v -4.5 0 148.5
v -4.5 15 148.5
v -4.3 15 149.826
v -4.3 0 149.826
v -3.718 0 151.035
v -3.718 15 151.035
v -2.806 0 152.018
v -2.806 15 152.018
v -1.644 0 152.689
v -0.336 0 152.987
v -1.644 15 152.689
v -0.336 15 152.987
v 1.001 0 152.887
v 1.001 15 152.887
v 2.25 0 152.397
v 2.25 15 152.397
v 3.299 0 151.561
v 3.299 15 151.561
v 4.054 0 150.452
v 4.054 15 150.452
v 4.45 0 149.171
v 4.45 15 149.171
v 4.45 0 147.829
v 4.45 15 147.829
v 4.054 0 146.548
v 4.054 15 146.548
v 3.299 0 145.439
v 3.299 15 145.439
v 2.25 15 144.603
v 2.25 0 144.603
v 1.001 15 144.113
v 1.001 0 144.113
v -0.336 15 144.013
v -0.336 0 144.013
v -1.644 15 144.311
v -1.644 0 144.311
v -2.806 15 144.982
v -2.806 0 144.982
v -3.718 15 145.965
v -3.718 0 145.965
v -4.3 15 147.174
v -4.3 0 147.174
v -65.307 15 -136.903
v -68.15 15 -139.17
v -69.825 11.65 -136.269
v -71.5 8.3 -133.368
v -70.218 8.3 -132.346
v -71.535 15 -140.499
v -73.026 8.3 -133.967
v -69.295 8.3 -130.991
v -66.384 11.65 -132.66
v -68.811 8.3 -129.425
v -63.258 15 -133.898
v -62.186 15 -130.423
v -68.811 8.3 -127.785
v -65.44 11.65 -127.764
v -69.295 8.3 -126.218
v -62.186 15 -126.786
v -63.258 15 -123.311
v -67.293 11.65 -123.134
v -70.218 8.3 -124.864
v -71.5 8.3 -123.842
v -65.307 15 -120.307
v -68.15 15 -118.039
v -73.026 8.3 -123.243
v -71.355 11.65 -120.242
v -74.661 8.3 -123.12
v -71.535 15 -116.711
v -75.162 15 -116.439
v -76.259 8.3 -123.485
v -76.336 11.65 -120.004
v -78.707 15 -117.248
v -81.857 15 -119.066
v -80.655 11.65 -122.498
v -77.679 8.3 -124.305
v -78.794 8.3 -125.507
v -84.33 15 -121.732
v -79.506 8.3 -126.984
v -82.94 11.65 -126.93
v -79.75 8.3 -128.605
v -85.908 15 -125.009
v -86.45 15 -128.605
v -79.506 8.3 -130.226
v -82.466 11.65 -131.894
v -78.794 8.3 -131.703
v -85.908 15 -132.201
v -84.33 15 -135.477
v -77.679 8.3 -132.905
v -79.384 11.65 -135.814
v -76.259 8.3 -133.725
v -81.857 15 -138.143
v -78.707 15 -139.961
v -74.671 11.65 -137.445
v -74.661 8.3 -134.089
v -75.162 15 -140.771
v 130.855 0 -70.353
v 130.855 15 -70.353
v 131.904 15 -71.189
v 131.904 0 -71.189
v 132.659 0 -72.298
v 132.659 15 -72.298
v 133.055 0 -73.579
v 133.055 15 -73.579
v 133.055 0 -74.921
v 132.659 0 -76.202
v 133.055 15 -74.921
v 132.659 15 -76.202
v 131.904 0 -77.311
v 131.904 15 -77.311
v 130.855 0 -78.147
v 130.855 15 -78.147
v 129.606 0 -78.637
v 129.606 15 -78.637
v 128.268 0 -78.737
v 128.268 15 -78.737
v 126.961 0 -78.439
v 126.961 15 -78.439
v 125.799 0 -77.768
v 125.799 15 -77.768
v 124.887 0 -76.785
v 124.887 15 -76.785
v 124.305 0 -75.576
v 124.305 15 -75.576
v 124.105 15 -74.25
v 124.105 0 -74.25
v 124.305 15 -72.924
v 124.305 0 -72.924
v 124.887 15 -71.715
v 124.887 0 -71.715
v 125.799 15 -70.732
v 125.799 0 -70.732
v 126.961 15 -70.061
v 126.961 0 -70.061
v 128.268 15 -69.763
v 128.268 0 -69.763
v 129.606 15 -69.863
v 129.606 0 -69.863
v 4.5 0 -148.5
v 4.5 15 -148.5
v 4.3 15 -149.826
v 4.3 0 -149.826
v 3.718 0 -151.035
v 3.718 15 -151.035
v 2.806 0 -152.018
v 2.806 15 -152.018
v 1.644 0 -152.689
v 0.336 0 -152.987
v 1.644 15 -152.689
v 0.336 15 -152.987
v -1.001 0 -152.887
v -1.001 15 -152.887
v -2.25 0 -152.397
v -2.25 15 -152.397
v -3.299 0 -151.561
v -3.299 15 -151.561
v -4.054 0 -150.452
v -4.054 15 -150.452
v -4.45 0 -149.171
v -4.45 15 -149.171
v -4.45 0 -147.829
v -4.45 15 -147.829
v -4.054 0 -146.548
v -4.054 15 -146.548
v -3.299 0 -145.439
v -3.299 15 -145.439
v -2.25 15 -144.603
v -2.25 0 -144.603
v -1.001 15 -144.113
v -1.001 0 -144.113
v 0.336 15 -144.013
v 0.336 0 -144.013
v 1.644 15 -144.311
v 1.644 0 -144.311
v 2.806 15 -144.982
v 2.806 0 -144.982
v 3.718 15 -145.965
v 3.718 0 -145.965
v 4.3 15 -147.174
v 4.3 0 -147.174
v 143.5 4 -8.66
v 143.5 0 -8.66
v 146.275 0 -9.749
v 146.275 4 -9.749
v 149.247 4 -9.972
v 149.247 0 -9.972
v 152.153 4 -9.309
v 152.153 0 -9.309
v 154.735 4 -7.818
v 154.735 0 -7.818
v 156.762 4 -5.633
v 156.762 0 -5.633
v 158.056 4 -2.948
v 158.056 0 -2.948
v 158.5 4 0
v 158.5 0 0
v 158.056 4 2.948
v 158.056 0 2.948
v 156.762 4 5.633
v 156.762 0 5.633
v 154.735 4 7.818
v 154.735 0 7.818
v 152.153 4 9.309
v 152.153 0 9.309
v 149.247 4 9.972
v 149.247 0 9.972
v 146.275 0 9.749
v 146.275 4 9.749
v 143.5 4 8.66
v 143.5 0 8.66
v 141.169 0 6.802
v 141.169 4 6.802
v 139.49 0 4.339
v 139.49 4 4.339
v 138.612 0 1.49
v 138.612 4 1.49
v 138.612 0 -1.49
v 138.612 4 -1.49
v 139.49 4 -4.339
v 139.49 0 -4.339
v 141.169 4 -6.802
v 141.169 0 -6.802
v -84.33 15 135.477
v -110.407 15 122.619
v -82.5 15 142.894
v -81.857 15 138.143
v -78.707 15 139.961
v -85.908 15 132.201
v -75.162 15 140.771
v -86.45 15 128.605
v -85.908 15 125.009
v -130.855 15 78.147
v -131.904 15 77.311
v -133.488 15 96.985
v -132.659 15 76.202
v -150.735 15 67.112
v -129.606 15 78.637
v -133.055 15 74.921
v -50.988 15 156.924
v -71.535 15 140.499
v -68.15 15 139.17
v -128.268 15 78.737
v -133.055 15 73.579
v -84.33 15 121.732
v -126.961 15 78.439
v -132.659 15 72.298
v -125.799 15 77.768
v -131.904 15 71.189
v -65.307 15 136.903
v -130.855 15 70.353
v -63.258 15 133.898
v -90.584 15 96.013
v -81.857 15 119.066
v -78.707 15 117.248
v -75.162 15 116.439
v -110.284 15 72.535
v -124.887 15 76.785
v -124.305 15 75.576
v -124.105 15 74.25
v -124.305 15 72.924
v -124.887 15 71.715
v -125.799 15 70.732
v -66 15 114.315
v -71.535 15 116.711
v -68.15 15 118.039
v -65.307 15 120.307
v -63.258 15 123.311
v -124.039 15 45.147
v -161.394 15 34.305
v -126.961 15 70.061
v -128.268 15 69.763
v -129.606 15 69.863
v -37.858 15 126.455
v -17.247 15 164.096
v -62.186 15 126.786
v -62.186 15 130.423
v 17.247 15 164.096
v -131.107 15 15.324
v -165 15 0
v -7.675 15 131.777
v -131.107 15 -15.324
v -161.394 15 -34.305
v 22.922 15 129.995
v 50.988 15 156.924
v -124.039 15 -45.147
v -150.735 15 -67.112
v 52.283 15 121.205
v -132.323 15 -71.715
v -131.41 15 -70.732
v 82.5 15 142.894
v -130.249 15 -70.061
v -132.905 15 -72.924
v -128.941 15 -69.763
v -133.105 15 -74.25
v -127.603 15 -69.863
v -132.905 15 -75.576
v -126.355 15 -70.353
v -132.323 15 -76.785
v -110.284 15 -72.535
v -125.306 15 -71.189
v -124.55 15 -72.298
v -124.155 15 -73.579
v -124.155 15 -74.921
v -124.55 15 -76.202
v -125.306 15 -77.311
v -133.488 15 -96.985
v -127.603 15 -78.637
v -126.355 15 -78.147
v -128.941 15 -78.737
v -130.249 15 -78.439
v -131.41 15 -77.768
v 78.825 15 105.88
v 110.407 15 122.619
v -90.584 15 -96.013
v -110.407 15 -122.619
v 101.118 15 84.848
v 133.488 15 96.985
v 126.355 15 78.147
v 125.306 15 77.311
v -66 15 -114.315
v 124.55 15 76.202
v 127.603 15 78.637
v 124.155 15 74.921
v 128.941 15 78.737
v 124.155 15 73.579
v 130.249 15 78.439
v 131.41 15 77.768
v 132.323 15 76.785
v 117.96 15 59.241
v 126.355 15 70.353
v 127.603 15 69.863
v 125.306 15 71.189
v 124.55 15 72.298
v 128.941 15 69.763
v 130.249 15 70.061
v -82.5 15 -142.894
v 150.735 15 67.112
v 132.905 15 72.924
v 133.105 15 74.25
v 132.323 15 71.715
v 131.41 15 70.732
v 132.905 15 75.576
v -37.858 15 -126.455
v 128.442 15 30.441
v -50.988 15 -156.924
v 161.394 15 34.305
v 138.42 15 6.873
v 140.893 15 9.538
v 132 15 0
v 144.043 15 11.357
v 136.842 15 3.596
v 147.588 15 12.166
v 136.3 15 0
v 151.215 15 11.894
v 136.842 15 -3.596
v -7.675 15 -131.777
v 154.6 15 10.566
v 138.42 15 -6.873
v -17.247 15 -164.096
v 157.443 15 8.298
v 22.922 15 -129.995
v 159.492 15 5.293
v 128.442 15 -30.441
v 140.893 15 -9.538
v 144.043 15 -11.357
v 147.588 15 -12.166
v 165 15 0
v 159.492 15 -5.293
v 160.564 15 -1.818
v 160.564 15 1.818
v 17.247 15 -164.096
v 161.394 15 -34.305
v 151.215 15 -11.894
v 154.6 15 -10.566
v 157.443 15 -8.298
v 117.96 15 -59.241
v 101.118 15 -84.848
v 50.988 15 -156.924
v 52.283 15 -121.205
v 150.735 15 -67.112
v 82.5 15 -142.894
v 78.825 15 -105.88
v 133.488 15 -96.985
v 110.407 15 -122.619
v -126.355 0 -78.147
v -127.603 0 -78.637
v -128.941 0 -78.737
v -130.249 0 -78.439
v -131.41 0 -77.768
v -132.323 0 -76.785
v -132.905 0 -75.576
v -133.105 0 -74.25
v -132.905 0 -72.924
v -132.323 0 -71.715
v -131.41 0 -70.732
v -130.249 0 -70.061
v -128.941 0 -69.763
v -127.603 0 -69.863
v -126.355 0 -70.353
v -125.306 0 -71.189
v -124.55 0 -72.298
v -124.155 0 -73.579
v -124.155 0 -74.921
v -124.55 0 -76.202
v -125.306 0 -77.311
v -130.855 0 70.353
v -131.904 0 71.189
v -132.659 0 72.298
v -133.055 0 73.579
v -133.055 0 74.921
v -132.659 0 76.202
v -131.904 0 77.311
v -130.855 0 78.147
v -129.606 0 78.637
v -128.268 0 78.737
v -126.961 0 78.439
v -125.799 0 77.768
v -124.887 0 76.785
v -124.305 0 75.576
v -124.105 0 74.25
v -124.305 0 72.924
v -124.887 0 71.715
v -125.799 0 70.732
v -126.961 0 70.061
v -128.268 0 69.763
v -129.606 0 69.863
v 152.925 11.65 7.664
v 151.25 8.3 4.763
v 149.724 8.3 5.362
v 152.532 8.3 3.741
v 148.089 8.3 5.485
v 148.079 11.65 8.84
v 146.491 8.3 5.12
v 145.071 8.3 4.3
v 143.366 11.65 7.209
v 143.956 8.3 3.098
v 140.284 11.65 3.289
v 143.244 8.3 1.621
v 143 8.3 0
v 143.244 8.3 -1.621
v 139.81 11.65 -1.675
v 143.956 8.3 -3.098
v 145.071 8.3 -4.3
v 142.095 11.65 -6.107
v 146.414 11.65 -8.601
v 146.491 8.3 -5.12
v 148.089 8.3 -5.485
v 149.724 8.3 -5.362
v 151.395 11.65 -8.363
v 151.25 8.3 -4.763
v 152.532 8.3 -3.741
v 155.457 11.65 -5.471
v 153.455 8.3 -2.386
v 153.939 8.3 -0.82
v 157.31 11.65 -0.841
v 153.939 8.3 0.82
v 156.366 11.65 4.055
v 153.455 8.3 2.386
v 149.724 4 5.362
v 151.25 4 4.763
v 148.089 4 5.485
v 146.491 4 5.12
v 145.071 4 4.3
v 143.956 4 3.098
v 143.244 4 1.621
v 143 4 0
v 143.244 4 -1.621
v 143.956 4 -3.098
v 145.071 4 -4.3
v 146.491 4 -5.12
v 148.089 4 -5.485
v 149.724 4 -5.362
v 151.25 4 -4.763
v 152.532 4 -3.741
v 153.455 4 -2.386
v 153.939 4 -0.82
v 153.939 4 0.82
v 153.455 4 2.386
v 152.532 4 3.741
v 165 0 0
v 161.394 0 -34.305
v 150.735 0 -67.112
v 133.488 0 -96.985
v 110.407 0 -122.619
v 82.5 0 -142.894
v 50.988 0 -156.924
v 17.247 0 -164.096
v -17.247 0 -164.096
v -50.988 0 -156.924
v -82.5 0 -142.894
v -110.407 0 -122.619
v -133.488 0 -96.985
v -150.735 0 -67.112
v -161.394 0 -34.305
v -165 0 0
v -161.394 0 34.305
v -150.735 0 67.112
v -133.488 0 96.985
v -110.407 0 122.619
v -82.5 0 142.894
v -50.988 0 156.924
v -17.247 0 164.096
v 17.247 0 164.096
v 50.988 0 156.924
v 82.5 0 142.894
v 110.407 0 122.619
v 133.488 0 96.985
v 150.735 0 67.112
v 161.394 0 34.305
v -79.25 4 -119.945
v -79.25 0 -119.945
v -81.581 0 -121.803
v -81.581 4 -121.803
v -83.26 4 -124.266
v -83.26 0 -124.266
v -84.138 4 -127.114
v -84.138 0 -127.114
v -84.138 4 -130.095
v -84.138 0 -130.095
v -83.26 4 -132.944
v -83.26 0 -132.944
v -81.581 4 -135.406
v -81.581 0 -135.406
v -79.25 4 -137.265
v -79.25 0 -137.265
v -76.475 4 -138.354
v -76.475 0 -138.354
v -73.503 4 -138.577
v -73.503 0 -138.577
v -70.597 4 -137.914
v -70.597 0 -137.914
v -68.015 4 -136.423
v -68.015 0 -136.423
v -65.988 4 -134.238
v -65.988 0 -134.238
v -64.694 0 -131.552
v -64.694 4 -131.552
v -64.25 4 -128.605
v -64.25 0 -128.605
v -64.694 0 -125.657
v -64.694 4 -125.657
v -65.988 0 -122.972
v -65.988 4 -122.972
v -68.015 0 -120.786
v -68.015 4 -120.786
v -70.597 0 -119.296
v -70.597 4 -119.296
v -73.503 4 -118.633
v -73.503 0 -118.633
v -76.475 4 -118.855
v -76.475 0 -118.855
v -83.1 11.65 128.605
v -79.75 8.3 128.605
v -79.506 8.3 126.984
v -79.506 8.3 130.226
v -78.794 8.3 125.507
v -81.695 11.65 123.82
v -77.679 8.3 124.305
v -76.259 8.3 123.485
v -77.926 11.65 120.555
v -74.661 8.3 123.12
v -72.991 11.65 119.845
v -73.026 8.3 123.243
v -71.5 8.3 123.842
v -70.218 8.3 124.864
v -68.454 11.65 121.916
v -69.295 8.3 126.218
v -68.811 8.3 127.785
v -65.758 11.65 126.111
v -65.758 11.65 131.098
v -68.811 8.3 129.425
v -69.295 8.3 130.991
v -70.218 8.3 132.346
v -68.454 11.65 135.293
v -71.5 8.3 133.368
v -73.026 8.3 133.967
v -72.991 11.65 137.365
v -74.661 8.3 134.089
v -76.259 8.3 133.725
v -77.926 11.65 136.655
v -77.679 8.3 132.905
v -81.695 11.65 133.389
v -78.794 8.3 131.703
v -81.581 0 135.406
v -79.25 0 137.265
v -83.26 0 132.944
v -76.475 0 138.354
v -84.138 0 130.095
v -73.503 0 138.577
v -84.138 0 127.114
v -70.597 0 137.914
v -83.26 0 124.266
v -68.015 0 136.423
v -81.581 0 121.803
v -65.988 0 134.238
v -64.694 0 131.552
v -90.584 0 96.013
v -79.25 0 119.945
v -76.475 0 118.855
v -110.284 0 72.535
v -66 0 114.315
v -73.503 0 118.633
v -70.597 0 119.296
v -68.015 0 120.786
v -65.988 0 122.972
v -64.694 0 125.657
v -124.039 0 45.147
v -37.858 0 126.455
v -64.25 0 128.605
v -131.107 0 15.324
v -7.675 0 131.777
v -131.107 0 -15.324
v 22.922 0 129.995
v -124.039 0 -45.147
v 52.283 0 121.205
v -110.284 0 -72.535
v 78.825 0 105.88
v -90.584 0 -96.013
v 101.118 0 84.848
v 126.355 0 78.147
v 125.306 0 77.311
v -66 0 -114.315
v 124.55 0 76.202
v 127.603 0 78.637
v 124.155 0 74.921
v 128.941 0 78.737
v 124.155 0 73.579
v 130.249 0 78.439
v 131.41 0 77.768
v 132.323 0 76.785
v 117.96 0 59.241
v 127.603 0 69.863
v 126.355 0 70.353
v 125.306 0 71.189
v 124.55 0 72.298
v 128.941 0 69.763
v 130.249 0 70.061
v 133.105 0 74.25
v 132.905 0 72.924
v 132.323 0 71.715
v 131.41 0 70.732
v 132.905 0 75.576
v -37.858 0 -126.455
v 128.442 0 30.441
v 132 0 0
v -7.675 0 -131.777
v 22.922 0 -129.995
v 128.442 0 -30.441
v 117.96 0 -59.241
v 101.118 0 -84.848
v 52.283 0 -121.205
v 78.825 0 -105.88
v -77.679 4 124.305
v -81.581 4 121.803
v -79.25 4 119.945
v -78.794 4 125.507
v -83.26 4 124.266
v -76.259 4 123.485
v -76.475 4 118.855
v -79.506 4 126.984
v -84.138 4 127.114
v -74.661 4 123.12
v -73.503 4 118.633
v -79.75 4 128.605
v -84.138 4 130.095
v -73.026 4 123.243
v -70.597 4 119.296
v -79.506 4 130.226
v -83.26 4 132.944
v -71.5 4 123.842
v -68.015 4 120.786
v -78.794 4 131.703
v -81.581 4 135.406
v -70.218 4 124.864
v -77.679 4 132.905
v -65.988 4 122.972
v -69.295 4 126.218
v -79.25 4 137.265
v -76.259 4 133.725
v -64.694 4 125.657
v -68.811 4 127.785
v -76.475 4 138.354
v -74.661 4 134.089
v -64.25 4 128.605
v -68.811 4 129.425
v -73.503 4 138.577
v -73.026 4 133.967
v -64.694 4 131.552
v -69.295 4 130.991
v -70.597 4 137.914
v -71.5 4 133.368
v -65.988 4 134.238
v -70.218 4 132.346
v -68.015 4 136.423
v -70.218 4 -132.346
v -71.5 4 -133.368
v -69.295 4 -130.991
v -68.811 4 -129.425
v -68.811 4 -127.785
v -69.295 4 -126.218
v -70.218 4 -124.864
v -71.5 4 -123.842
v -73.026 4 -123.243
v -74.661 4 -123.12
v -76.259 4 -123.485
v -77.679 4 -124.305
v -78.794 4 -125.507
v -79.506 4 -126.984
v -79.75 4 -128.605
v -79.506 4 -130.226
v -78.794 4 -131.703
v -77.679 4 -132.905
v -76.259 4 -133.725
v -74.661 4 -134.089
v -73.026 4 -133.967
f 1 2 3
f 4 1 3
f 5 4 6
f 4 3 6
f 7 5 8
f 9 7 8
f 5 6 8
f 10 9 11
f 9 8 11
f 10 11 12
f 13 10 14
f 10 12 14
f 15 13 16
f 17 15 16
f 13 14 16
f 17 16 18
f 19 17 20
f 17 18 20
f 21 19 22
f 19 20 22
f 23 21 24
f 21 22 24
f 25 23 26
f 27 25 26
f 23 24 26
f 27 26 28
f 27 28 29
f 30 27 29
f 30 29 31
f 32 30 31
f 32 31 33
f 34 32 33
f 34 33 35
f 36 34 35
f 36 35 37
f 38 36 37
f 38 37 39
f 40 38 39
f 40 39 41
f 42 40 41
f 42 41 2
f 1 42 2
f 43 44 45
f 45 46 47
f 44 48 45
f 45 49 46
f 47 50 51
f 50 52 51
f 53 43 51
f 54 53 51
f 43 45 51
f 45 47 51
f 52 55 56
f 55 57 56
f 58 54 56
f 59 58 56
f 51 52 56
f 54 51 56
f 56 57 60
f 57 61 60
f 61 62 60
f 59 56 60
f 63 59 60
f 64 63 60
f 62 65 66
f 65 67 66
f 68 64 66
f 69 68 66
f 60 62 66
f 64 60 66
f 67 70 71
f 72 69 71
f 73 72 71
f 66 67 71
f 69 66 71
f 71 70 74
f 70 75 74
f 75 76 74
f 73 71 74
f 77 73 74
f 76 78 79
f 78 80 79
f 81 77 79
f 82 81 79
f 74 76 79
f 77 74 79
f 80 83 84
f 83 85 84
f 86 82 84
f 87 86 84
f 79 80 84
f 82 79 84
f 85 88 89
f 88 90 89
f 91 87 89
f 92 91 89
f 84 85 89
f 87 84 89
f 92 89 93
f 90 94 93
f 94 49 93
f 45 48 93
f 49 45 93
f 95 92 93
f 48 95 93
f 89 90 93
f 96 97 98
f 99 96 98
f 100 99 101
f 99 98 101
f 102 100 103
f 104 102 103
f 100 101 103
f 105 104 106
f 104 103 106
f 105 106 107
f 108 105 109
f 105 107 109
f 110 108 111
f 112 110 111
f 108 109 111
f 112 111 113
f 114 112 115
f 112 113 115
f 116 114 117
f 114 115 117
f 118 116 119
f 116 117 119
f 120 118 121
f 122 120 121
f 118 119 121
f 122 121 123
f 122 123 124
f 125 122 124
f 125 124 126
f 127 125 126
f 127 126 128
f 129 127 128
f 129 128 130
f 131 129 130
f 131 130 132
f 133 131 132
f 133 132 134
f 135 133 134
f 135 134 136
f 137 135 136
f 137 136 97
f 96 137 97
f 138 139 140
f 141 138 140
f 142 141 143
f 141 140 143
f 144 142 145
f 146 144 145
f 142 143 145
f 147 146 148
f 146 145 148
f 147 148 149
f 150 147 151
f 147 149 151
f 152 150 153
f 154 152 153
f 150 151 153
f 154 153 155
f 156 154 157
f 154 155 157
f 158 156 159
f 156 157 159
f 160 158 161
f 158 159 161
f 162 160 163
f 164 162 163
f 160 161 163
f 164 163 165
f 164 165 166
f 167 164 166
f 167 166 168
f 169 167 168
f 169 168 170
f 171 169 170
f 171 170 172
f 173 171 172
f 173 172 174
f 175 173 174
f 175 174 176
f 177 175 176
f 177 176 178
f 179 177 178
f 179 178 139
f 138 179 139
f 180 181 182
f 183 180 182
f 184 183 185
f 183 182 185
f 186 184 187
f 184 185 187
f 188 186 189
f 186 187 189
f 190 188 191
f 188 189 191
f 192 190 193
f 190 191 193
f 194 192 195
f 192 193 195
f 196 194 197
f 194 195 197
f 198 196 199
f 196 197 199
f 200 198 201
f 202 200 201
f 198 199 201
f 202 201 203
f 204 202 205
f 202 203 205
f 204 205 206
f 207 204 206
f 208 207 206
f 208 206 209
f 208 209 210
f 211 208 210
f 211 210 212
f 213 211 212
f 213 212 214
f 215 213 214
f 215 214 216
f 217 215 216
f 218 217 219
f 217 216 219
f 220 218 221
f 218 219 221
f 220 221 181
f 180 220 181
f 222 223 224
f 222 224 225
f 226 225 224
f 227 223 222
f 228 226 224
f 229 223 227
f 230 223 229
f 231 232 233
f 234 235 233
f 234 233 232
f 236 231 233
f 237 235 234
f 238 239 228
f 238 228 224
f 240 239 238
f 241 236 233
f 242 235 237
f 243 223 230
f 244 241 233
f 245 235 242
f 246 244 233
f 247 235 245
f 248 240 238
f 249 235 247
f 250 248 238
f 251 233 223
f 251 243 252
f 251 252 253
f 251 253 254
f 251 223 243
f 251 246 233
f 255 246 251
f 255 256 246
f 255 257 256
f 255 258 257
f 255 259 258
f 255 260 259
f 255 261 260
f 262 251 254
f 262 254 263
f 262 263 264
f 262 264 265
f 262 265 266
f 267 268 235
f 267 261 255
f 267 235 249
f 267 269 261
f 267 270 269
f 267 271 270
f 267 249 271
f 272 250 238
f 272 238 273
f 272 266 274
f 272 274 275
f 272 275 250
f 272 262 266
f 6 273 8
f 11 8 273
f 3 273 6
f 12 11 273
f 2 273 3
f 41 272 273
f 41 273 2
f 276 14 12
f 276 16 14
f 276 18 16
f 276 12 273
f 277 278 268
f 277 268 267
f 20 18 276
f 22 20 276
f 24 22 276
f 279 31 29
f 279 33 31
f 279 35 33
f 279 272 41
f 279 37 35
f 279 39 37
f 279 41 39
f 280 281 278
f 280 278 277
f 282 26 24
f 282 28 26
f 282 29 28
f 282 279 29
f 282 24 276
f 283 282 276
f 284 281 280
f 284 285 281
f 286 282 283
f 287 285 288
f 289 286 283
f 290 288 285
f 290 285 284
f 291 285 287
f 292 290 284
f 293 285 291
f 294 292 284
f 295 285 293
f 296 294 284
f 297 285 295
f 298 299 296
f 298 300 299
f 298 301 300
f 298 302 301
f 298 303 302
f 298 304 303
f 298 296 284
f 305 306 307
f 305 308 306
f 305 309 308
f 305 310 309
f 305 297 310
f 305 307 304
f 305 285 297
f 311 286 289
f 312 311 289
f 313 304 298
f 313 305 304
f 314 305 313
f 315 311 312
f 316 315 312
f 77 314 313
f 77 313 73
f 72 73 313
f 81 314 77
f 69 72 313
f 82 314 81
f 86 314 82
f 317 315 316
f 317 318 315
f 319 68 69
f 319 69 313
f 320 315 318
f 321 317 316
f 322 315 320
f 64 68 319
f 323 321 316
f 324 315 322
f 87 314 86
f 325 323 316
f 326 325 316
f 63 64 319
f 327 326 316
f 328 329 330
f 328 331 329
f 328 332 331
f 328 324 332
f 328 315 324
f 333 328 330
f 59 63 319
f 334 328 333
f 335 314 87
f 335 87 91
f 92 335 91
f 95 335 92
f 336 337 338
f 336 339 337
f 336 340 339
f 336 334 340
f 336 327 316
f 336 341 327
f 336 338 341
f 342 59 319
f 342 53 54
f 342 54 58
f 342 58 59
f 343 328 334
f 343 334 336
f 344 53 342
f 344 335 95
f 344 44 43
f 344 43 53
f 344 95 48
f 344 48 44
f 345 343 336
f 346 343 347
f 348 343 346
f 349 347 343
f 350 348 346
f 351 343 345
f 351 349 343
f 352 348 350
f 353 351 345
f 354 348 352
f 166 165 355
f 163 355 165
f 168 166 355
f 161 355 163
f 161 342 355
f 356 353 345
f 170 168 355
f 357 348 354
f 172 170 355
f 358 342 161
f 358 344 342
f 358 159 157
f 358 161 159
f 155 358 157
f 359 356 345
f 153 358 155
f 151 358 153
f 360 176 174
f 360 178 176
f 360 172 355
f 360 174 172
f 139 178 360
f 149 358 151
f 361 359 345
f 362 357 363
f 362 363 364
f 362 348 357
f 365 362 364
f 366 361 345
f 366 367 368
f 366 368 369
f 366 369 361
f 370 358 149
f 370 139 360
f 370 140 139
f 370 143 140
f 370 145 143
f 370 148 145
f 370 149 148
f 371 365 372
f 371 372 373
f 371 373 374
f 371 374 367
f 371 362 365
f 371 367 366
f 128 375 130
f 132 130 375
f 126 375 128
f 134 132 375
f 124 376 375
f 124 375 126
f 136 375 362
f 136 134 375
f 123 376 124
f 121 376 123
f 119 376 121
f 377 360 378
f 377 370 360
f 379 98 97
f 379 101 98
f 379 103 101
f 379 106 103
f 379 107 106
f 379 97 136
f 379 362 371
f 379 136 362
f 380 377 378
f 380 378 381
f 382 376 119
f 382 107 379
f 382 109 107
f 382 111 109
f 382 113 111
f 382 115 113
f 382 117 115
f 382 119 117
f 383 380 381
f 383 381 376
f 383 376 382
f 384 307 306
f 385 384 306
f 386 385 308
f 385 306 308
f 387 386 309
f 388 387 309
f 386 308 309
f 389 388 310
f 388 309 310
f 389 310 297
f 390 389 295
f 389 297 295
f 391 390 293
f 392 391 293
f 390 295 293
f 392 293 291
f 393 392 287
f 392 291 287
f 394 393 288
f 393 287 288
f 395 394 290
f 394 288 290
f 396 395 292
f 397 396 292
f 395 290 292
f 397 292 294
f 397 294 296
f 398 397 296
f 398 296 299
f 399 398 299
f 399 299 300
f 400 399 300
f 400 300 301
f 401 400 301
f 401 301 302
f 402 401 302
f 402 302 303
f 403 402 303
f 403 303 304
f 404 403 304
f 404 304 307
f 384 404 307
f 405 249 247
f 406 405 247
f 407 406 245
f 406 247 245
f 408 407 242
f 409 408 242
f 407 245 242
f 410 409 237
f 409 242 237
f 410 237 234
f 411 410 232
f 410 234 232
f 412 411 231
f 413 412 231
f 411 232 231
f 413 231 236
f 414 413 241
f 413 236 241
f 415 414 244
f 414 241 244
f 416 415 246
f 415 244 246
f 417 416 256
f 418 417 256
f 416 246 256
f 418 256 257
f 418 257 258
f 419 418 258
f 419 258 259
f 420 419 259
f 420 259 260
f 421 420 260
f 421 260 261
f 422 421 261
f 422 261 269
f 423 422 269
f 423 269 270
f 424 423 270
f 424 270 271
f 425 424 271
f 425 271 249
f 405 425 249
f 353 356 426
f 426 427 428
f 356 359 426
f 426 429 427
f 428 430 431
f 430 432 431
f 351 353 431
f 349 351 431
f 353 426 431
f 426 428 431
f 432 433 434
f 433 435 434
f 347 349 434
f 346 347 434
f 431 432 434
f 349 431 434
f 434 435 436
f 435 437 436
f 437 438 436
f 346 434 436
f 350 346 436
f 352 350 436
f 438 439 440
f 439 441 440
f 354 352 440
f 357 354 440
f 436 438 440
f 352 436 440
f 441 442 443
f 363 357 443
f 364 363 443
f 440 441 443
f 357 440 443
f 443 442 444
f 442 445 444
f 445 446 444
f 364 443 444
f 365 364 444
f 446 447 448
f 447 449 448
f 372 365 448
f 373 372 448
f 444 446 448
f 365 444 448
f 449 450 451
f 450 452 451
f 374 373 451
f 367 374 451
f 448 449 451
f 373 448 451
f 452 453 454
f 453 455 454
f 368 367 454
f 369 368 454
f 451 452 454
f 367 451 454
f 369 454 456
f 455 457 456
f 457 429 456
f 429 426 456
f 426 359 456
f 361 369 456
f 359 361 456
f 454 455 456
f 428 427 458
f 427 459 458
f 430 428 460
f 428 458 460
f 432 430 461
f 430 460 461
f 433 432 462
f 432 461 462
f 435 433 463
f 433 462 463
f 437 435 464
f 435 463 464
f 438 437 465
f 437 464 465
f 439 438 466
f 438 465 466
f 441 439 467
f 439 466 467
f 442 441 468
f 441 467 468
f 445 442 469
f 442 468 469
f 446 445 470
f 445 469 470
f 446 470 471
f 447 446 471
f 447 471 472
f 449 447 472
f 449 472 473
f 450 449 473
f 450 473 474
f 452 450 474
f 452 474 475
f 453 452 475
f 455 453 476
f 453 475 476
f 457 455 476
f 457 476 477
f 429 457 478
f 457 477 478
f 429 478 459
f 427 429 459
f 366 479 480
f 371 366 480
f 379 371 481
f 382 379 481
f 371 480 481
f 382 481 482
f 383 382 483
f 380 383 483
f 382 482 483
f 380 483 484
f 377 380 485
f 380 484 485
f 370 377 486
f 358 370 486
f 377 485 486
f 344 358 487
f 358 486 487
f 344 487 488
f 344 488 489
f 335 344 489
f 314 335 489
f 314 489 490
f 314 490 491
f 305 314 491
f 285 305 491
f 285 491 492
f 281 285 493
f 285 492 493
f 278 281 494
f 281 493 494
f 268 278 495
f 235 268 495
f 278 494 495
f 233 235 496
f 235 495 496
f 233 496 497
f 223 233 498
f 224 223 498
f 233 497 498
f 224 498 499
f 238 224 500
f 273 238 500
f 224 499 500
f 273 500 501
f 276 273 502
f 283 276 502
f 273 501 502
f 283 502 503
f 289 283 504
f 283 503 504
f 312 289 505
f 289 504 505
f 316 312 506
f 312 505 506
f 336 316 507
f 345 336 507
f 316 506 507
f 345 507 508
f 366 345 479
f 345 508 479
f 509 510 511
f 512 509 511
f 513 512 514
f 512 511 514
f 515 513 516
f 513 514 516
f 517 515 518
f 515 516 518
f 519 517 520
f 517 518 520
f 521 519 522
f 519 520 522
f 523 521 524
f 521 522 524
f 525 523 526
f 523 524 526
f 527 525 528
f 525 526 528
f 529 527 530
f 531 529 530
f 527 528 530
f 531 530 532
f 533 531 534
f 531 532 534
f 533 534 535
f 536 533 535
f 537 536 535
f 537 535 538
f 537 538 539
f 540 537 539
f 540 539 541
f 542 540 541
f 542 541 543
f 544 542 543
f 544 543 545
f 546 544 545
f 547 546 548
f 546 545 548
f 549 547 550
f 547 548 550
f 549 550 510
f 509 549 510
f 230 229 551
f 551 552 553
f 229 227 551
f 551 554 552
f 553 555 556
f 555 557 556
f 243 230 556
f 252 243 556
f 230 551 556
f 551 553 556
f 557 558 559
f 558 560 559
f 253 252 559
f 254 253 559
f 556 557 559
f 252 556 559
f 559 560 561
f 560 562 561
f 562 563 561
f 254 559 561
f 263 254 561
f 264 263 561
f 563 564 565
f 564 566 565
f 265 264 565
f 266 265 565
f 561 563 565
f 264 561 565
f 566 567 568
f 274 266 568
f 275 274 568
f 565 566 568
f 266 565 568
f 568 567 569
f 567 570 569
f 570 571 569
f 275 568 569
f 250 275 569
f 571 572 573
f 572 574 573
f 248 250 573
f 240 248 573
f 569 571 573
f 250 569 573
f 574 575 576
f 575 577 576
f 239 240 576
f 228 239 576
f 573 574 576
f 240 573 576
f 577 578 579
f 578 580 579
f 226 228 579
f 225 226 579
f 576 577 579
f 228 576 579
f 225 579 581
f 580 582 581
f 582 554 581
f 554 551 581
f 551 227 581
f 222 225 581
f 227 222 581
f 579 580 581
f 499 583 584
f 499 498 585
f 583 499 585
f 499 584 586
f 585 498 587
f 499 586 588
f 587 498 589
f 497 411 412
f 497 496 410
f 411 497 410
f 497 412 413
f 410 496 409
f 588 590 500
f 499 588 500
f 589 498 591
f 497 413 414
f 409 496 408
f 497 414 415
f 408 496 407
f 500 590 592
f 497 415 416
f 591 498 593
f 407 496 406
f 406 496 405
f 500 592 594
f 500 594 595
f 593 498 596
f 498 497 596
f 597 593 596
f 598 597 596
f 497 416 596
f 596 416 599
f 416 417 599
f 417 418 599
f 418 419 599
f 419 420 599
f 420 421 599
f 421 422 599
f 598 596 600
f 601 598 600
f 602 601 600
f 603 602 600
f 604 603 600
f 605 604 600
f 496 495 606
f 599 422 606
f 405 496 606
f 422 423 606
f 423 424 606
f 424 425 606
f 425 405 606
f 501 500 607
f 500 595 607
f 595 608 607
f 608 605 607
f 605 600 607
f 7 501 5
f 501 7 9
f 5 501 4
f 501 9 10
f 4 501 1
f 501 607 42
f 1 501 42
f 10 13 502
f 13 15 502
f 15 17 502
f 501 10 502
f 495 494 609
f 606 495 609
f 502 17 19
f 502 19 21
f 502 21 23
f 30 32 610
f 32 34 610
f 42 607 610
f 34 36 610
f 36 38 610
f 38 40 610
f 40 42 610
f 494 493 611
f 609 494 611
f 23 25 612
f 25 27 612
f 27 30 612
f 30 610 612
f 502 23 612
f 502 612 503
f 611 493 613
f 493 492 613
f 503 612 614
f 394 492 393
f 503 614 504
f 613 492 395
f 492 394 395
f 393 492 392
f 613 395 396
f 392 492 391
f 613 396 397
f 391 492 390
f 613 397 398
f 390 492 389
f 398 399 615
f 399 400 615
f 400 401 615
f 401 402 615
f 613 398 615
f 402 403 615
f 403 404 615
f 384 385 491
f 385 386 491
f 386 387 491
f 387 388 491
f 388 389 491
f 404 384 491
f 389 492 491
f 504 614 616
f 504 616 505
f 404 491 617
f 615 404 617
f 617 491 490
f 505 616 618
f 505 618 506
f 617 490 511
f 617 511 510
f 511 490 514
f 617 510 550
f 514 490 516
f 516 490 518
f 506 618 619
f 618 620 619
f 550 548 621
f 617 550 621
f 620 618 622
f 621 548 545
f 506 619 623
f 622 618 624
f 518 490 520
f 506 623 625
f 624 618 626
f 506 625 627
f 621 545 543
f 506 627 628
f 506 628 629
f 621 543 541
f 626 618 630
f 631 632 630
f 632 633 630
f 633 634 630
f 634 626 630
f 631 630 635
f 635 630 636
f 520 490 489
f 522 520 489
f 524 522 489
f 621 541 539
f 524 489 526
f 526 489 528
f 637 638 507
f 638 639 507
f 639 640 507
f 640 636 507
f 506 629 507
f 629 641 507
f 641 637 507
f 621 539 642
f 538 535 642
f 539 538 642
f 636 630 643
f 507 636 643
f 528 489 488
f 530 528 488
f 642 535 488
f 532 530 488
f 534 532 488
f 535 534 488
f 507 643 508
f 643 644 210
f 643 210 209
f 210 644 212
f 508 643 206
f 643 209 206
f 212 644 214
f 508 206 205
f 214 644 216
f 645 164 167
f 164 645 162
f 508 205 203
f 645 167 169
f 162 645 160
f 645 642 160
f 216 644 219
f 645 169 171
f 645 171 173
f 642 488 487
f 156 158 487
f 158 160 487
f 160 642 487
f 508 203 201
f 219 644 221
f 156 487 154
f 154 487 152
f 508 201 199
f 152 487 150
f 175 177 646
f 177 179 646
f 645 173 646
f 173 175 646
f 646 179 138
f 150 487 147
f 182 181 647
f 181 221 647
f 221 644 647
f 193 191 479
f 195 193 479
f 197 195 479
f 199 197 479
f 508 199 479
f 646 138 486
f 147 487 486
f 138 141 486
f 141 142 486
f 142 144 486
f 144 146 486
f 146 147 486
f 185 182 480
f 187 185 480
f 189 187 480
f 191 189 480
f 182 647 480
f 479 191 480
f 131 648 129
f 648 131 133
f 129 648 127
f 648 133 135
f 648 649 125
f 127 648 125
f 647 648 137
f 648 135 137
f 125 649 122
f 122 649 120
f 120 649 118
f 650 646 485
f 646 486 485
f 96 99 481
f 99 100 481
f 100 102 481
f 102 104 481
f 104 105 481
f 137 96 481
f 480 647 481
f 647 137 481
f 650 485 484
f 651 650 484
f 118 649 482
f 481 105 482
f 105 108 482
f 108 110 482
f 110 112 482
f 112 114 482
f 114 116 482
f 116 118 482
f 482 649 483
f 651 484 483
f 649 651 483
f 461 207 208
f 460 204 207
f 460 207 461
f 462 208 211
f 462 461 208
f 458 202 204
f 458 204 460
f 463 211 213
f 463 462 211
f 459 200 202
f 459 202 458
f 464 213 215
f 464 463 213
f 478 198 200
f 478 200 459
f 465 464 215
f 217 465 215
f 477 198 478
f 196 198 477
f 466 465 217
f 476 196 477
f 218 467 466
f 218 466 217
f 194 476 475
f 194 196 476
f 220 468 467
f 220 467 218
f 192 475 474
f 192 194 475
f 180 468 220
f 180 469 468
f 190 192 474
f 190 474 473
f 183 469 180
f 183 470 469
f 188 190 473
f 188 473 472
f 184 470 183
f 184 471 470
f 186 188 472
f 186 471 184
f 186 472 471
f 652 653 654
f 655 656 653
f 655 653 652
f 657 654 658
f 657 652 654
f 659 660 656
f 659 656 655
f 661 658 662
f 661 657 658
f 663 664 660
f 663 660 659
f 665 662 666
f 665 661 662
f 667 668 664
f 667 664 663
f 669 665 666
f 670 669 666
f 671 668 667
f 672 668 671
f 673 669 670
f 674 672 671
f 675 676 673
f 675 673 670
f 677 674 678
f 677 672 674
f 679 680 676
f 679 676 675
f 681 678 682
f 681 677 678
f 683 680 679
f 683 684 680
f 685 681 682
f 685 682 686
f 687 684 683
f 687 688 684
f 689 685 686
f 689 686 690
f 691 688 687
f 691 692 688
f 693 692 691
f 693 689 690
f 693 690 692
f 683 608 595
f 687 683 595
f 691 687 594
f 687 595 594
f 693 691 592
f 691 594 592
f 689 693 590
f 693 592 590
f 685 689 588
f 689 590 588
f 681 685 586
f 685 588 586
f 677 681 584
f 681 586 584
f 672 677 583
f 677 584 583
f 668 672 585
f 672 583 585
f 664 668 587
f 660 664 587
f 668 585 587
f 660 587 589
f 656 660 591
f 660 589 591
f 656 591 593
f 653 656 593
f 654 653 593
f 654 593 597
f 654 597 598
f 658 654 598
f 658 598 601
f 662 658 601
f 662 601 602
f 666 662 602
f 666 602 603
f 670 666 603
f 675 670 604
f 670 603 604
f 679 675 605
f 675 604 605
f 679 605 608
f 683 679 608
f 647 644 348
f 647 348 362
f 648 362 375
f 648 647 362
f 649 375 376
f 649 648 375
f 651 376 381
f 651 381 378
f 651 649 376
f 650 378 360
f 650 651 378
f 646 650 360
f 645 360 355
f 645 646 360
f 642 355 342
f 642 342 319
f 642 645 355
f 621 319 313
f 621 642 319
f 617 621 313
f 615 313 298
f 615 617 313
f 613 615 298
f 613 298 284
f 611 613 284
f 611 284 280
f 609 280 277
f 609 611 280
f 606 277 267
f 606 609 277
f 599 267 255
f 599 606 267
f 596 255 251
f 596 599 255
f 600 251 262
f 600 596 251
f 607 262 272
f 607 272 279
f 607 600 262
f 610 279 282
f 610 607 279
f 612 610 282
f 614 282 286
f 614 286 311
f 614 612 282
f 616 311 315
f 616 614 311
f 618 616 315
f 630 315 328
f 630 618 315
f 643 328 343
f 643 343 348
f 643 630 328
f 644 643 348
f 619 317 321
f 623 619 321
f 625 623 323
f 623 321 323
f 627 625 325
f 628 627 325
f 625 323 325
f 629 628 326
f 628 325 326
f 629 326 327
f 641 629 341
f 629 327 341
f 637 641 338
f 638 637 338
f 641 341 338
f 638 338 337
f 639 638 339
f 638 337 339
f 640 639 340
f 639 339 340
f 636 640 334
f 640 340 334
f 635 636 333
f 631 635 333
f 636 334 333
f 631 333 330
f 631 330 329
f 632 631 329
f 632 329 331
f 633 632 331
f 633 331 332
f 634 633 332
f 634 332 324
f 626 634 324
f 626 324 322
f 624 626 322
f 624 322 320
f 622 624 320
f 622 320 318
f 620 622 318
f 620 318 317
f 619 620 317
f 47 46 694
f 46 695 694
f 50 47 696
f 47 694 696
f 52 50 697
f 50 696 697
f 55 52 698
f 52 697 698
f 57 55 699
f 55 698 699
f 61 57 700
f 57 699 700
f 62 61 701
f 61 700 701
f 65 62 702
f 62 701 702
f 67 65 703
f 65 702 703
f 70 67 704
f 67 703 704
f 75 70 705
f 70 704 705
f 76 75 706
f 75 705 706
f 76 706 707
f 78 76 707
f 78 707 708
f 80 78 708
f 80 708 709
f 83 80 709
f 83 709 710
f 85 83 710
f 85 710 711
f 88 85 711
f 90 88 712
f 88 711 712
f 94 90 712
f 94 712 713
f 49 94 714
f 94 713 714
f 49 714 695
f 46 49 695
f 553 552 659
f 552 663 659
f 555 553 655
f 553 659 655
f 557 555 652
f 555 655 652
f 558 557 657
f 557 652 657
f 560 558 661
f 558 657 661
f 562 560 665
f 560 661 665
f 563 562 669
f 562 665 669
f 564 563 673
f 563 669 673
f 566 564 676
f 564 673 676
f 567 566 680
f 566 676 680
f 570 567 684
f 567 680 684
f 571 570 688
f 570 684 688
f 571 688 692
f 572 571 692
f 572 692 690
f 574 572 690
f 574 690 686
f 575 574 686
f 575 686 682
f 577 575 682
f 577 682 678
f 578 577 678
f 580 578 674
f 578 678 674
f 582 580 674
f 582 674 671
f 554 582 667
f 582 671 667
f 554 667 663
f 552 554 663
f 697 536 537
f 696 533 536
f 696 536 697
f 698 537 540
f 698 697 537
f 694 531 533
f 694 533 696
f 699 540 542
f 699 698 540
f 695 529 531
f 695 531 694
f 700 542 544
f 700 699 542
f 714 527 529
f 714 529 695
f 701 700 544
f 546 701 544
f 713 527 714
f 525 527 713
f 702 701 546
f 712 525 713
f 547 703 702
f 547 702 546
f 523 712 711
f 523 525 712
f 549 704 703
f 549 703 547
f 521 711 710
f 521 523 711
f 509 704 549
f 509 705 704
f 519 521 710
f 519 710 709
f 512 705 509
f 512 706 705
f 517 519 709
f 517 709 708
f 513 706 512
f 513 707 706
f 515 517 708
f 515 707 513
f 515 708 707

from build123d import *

# Parameters (mm, degrees)
SKETCH1_R                                            = 165
SKETCH1_R_2                                          = 132
BOSS_EXTRUDE1_DEPTH                                  = 15
M8_CLEARANCE_HOLE1_D                                 = 9
CIRPATTERN1_COUNT                                    = 6
SKETCH4_R                                            = 10
CUT_EXTRUDE1_DEPTH                                   = 4
CSK_FOR_M10_HEX_SOCKET_COUNTERSUNK_CAP_S_D           = 11
CSK_FOR_M10_HEX_SOCKET_COUNTERSUNK_CAP_S_CSINK_D     = 24.4
CSK_FOR_M10_HEX_SOCKET_COUNTERSUNK_CAP_S_CSINK_ANGLE = 90
CIRPATTERN2_COUNT                                    = 3


with BuildPart() as part:
    # Sketch1 → Boss-Extrude1 (new body)
    with BuildSketch(Plane(origin=(0, 0, 0), x_dir=(1, 0, 0), z_dir=(0, 1, 0))):
        Circle(SKETCH1_R)
        Circle(SKETCH1_R_2, mode=Mode.SUBTRACT)
    extrude(amount=BOSS_EXTRUDE1_DEPTH)

    # M8 Clearance Hole1 (through all)
    with Locations(Plane(origin=(0, 0, 0), x_dir=(-1, 0, 0), z_dir=(0, -1, 0))):
        with Locations((0, 148.5)):
            m8_clearance_hole1 = Hole(M8_CLEARANCE_HOLE1_D / 2)

    # CirPattern1: M8 Clearance Hole1 ×6 about axis
    cirpattern1_axis = Axis((0, 0, 0), (0, 1, 0))
    for i in range(1, CIRPATTERN1_COUNT):
        add(m8_clearance_hole1.rotate(cirpattern1_axis, i * 360 / CIRPATTERN1_COUNT), mode=Mode.SUBTRACT)

    # Sketch4 → Cut-Extrude1 (cut)
    with BuildSketch(Plane.XZ):
        with Locations((-74.25, 128.604772462)):
            Circle(SKETCH4_R)
    cut_extrude1 = extrude(amount=-CUT_EXTRUDE1_DEPTH, mode=Mode.SUBTRACT)

    # CSK for M10 Hex Socket Countersunk Cap Screw1 (through all)
    with Locations(Plane(origin=(0, 15, 0), x_dir=(1, 0, 0), z_dir=(0, 1, 0))):
        with Locations((-74.25, -128.604772462)):
            csk_for_m10_hex_socket_countersunk_cap_s = CounterSinkHole(CSK_FOR_M10_HEX_SOCKET_COUNTERSUNK_CAP_S_D / 2, CSK_FOR_M10_HEX_SOCKET_COUNTERSUNK_CAP_S_CSINK_D / 2, counter_sink_angle=CSK_FOR_M10_HEX_SOCKET_COUNTERSUNK_CAP_S_CSINK_ANGLE)

    # CirPattern2: Cut-Extrude1, CSK for M10 Hex Socket Countersunk Cap Screw1 ×3 about axis
    cirpattern2_axis = Axis((0, 0, 0), (0, 1, 0))
    for i in range(1, CIRPATTERN2_COUNT):
        add(cut_extrude1.rotate(cirpattern2_axis, i * 360 / CIRPATTERN2_COUNT), mode=Mode.SUBTRACT)
        add(csk_for_m10_hex_socket_countersunk_cap_s.rotate(cirpattern2_axis, i * 360 / CIRPATTERN2_COUNT), mode=Mode.SUBTRACT)


solid = part.part
